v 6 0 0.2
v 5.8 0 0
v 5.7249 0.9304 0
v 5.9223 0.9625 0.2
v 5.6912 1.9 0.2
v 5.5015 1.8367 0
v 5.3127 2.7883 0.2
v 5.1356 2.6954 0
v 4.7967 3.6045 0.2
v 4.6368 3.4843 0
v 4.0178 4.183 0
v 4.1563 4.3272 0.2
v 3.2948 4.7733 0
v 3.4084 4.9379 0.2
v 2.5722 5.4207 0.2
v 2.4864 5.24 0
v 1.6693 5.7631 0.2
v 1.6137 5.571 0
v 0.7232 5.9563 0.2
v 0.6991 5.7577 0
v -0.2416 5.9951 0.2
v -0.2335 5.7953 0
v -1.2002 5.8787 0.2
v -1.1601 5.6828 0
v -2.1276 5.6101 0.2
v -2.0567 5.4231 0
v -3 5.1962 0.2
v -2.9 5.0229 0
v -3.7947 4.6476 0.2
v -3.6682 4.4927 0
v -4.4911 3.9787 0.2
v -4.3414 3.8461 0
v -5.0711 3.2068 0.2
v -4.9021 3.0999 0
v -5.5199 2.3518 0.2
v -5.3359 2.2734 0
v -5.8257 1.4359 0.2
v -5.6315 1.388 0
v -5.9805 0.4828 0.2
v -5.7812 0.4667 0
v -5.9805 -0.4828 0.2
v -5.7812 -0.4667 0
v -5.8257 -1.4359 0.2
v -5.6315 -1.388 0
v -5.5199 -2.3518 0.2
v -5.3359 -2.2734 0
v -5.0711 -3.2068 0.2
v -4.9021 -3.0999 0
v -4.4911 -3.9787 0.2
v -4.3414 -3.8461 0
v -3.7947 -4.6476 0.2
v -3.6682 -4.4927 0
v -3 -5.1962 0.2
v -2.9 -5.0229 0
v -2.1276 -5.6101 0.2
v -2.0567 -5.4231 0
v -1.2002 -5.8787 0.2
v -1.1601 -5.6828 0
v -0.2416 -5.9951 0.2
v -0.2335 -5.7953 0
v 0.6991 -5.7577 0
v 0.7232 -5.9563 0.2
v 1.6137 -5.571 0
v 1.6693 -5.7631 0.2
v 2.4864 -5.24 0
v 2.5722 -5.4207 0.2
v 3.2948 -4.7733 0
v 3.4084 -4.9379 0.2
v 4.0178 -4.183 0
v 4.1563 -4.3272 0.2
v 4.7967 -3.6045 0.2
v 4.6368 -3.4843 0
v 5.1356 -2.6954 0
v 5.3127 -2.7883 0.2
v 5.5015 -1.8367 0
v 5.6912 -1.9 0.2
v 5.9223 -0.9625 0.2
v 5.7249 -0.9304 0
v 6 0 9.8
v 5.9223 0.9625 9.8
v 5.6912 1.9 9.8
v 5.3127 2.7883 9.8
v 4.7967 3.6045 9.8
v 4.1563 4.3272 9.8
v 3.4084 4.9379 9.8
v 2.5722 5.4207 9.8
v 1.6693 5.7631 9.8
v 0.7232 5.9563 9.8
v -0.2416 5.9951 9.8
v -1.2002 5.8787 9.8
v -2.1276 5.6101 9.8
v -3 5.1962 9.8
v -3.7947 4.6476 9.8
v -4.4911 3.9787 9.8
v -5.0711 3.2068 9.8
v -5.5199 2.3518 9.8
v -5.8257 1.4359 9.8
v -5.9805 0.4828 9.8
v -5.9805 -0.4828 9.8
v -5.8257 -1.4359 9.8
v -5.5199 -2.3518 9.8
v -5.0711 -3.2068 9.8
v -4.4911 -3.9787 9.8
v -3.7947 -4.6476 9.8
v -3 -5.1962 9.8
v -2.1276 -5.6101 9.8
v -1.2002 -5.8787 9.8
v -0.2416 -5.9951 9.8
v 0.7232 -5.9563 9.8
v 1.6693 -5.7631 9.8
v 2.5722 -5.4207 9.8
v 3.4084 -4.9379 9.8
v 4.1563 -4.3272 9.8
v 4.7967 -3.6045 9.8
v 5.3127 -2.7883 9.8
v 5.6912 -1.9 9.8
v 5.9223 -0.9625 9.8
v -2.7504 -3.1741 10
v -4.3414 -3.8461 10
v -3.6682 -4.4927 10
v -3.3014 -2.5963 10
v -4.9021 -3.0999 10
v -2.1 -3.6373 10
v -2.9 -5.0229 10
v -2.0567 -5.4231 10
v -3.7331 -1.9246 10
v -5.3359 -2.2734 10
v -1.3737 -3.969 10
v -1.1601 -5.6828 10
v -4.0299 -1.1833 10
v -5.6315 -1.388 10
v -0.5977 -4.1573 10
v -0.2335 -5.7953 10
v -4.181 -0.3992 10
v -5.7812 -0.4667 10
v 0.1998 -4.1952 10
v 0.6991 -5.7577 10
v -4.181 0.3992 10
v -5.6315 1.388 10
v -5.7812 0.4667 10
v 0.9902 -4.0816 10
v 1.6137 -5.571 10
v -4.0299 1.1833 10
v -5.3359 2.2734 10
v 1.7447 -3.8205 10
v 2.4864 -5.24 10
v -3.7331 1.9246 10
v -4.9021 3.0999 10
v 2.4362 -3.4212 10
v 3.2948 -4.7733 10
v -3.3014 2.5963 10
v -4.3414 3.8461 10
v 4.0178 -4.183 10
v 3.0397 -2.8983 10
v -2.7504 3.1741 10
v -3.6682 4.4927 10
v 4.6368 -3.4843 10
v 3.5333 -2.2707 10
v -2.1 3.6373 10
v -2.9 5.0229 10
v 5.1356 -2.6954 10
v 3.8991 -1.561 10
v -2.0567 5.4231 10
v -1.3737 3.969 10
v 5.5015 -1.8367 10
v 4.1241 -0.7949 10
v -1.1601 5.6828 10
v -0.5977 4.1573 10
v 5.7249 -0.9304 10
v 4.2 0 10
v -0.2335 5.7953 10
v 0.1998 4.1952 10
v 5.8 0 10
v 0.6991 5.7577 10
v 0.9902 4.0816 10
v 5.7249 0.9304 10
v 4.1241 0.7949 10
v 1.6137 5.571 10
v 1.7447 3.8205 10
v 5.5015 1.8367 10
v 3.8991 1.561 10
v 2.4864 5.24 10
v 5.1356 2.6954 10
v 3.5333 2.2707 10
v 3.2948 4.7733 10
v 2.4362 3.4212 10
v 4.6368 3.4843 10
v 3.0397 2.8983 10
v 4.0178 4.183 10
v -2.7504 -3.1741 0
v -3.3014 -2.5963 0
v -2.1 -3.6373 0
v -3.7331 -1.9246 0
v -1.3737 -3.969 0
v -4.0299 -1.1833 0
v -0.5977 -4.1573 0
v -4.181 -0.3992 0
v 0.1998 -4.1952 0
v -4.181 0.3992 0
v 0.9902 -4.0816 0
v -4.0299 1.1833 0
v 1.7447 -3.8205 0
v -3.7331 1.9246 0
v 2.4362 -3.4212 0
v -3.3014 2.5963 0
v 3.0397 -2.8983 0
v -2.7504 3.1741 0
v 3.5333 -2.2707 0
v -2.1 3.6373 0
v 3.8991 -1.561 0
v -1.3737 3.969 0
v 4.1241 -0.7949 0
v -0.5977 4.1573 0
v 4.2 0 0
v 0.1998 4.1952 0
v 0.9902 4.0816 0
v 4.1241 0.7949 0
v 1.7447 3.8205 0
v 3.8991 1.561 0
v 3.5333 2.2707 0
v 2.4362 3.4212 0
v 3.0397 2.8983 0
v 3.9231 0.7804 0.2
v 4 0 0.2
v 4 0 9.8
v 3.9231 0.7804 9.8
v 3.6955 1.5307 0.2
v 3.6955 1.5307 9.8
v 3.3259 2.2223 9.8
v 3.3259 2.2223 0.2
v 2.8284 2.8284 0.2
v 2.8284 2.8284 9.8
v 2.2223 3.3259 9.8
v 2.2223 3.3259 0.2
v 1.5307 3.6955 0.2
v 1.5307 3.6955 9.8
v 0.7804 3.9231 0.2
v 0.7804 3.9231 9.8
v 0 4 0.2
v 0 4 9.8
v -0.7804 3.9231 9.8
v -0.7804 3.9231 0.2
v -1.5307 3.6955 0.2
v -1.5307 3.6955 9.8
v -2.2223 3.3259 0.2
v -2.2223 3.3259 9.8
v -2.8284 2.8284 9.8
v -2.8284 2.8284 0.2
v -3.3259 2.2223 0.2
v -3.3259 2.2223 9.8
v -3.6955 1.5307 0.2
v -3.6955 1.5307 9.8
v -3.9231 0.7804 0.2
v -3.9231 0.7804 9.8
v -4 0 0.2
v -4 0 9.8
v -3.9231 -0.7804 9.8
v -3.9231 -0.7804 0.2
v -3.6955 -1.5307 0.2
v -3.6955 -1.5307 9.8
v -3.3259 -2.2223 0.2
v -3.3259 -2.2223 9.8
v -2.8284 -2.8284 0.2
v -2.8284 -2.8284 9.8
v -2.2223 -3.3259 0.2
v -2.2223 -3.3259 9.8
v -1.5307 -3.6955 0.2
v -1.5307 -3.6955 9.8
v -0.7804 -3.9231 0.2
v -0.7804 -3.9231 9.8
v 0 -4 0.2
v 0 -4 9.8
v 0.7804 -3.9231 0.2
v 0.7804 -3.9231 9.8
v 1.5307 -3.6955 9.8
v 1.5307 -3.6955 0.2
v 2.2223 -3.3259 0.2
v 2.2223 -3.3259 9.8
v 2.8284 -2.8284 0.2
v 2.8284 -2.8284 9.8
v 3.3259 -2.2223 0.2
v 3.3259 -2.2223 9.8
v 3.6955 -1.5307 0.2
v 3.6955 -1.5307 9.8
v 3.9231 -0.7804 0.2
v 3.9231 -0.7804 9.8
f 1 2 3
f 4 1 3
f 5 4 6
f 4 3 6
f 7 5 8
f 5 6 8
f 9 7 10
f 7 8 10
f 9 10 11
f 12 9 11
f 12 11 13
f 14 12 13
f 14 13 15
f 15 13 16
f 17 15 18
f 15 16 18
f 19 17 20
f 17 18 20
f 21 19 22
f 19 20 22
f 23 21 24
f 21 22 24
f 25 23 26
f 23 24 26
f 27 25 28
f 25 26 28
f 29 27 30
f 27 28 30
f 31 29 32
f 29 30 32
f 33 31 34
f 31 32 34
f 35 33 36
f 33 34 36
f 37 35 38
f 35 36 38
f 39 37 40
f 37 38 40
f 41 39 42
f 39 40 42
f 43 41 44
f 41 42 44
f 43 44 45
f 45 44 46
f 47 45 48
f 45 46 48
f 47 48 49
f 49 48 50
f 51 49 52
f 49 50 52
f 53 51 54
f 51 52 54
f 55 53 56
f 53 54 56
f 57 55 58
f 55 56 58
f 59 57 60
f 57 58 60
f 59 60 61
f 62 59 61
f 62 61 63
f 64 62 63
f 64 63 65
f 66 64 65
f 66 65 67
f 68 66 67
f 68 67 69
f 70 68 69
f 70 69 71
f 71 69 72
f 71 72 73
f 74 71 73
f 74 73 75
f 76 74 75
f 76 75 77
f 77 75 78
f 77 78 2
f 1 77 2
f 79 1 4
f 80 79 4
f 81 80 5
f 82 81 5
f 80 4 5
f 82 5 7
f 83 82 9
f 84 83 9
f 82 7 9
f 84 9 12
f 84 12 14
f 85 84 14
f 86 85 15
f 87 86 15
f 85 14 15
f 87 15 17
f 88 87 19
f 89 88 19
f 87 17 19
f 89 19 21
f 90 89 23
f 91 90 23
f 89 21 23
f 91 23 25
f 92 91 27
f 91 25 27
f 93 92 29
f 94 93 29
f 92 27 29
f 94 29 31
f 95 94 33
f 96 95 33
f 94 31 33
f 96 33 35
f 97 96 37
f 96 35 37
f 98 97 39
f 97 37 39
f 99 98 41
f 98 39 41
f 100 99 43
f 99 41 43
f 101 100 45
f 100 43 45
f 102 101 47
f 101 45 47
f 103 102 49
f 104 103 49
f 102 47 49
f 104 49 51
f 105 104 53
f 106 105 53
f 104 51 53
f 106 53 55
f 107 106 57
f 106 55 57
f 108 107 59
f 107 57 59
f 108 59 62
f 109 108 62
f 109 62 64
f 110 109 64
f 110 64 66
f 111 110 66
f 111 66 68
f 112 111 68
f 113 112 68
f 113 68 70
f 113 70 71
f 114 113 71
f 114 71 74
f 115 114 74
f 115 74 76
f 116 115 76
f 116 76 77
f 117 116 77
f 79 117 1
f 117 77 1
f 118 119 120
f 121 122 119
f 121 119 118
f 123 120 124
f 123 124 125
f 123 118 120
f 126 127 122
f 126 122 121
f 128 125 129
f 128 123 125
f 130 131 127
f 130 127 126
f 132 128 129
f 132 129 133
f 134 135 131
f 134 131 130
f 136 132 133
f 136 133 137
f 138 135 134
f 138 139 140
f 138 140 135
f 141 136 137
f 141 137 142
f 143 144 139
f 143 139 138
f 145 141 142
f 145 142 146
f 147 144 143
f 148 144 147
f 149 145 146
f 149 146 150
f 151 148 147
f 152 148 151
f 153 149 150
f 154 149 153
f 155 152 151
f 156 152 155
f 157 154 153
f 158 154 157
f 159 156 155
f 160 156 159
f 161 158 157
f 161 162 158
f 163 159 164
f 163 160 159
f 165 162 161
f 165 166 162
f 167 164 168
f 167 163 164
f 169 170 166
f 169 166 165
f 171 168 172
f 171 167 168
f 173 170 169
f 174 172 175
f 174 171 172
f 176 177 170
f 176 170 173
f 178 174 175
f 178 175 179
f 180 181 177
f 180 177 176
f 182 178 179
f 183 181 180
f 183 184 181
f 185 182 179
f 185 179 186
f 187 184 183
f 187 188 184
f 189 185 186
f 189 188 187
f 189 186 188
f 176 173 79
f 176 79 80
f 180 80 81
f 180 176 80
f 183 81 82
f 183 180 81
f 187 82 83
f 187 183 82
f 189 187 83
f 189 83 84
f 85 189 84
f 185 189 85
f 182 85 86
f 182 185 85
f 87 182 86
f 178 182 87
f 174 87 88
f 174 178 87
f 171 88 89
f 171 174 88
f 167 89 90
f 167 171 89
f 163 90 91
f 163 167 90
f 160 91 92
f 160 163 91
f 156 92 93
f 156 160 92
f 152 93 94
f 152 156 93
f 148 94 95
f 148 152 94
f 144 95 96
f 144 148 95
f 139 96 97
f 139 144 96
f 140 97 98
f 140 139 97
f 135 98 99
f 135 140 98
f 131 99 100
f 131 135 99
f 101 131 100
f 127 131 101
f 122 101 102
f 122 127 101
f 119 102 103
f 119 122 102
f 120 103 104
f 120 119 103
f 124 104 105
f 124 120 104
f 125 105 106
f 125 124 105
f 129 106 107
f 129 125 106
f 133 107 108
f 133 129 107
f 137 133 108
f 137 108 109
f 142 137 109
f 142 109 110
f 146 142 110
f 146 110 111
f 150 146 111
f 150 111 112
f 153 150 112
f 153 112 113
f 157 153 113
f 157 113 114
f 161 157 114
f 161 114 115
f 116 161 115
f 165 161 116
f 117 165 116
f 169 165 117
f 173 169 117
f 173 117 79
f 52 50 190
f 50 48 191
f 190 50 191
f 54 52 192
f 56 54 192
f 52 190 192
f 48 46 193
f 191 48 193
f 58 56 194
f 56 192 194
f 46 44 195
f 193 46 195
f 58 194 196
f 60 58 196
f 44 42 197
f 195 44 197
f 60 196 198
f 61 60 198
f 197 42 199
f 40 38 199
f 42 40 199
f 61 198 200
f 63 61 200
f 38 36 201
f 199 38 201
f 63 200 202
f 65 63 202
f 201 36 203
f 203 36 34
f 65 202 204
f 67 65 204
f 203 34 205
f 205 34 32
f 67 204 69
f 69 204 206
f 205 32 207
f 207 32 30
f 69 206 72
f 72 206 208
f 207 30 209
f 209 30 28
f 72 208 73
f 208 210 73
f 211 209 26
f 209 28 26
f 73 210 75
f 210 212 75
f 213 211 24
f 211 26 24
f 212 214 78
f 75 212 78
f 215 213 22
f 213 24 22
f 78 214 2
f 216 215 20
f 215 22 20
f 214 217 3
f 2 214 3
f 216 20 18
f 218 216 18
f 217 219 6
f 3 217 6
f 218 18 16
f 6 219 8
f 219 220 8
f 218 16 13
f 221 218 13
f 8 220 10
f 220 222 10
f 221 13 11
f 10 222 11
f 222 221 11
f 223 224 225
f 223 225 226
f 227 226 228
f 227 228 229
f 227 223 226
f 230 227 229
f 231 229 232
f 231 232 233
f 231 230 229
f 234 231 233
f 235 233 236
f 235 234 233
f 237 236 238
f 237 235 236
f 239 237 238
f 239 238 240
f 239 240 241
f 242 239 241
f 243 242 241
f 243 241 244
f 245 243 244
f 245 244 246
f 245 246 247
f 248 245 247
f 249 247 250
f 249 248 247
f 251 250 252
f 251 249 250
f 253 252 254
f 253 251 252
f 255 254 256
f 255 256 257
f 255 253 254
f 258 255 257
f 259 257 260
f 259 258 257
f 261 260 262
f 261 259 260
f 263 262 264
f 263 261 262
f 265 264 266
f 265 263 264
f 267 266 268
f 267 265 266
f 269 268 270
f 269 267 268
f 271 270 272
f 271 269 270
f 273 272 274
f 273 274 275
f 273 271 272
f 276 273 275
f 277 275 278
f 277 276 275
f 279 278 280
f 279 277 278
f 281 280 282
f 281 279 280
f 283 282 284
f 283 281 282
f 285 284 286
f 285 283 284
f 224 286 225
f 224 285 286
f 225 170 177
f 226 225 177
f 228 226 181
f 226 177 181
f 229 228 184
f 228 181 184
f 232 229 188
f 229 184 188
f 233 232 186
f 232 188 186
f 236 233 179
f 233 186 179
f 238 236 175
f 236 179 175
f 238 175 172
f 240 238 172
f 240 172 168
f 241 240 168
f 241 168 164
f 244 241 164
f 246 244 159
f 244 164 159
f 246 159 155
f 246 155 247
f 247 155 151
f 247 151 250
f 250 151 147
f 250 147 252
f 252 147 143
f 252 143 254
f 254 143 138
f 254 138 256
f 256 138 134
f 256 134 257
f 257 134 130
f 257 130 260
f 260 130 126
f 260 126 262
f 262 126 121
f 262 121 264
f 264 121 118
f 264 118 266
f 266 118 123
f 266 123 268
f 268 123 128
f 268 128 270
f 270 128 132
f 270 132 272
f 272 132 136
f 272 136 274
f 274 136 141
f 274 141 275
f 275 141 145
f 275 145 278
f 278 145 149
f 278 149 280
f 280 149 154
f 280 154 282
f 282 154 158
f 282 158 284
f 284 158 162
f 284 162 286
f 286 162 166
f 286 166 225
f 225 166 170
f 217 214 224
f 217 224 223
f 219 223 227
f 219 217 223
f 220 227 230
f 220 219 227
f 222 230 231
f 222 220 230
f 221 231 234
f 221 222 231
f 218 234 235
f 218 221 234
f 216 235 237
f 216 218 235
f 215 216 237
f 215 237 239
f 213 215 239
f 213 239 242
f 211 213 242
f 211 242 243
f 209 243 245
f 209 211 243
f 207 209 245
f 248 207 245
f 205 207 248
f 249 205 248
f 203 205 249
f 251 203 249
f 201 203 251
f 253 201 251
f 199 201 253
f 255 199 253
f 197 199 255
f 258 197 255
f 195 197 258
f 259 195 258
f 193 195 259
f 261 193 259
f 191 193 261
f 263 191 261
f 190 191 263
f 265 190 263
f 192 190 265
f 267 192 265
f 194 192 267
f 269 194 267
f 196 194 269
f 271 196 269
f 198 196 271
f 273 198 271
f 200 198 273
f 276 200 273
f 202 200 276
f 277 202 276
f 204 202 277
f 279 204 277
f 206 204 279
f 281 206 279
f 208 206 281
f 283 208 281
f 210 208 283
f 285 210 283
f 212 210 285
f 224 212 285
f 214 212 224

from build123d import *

# Parameters (mm, degrees)
ESQUISSE1_R        = 6
ESQUISSE1_R_2      = 4
BOSS_EXTRU_1_DEPTH = 10
CHANFREIN1_SIZE    = 0.2


with BuildPart() as part:
    # Esquisse1 → Boss.-Extru.1 (new body)
    with BuildSketch(Plane.XY):
        Circle(ESQUISSE1_R)
        Circle(ESQUISSE1_R_2, mode=Mode.SUBTRACT)
    extrude(amount=BOSS_EXTRU_1_DEPTH)

    # Chanfrein1
    chanfrein1_edges = [part.edges().sort_by_distance(p)[0] for p in [
        (-6, 0, 0),
        (-6, 0, 10),
        (-4, 0, 0),
        (-4, 0, 10),
    ]]
    chamfer(chanfrein1_edges, length=CHANFREIN1_SIZE)


solid = part.part
